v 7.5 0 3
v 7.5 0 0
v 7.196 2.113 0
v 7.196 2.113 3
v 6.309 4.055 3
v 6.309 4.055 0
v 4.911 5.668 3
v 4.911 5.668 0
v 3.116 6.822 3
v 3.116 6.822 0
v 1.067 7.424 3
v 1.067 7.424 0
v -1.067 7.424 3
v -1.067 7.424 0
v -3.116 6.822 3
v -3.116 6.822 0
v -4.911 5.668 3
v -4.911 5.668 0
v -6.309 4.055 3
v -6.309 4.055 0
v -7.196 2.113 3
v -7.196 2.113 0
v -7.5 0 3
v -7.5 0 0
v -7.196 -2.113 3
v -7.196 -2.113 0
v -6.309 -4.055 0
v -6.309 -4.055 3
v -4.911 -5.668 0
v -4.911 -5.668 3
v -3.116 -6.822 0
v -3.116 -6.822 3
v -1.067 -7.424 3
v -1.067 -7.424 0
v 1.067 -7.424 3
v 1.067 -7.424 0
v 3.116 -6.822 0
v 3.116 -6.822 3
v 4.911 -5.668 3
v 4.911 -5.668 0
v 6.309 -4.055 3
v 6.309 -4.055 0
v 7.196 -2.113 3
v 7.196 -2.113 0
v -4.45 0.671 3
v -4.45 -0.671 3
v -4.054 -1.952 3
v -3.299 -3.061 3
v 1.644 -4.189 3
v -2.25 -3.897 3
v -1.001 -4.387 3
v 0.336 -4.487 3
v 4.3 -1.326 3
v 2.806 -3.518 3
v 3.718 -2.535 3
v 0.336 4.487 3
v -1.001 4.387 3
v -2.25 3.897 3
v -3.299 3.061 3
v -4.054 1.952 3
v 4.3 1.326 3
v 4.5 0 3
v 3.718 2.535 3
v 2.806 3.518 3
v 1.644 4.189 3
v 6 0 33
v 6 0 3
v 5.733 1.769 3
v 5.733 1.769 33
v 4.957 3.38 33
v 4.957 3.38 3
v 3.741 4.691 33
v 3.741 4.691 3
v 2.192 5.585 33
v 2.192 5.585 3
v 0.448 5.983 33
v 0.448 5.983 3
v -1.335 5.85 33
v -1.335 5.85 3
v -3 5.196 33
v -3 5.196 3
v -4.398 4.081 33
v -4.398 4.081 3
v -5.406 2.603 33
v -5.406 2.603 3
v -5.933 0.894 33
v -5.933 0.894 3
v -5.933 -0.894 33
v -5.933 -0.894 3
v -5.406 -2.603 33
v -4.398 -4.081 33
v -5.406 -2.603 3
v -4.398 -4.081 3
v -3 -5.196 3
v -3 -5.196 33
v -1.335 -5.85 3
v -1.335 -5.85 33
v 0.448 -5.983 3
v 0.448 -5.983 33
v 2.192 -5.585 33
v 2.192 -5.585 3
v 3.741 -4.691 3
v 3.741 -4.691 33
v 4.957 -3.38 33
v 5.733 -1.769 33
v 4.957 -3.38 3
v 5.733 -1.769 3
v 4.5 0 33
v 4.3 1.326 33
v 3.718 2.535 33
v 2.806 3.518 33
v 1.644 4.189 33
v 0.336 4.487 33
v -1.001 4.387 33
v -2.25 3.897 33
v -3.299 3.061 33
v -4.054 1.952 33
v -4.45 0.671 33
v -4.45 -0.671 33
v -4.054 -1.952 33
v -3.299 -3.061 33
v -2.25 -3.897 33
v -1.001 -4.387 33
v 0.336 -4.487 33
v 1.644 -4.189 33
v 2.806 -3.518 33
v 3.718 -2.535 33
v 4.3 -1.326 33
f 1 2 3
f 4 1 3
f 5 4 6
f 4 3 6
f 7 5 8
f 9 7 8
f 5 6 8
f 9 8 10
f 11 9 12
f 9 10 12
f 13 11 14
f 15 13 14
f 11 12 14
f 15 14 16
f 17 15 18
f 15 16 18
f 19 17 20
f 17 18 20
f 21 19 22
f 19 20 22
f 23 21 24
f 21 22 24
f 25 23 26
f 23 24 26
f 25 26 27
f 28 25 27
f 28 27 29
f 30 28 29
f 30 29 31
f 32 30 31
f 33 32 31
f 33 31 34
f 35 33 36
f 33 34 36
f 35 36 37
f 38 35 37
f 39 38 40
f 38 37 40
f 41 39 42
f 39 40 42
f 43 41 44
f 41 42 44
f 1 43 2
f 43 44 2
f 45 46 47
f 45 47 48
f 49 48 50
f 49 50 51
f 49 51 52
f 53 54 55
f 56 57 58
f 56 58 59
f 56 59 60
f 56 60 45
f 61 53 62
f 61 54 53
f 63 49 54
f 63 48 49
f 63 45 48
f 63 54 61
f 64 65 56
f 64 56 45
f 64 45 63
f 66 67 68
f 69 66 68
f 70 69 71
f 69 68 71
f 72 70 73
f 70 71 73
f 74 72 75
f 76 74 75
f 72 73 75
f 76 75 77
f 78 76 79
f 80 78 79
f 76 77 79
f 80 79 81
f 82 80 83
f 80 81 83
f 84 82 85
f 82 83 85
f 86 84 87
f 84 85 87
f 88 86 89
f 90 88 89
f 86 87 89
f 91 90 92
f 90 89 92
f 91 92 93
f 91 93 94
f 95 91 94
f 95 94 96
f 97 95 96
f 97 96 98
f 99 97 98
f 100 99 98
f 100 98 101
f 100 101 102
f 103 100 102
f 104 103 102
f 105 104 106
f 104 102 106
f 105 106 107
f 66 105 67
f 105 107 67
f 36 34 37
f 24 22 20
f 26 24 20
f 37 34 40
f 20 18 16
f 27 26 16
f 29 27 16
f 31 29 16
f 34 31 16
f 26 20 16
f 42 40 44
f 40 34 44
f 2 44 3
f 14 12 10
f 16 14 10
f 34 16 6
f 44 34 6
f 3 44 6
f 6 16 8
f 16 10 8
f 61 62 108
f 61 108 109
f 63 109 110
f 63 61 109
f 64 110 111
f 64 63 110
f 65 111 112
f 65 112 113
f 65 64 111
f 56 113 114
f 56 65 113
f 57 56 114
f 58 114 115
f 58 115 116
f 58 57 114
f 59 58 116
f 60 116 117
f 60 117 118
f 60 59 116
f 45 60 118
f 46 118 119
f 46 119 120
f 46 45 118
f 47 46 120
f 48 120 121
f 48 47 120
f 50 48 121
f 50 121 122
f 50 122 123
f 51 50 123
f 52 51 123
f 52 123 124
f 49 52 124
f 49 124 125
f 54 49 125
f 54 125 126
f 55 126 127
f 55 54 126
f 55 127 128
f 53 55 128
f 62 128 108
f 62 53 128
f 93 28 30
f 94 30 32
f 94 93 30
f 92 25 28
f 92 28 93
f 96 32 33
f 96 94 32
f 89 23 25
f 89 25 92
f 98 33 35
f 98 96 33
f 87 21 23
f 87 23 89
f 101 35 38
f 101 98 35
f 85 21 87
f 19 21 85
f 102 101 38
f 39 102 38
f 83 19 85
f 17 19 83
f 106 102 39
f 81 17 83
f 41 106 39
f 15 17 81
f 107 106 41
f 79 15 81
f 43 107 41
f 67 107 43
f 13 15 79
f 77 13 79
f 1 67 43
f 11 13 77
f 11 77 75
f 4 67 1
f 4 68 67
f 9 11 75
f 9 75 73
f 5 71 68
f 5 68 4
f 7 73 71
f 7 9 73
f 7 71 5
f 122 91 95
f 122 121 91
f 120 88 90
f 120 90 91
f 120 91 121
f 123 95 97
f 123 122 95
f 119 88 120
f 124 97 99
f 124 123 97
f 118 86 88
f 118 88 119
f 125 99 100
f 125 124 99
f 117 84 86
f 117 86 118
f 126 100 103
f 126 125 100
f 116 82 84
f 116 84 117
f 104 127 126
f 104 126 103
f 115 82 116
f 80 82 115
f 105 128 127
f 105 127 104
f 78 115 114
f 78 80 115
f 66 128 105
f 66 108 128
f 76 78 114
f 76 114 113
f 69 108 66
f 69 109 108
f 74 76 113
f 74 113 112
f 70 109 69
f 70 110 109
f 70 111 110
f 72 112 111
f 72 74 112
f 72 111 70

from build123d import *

# Parameters (mm, degrees)
ESBO_O1_R                = 7.5
RESSALTO_EXTRUS_O1_DEPTH = 3
ESBO_O2_R                = 6
ESBO_O2_R_2              = 4.5
RESSALTO_EXTRUS_O2_DEPTH = 30


with BuildPart() as part:
    # Esboço1 → Ressalto-extrusão1 (new body)
    with BuildSketch(Plane.XY):
        Circle(ESBO_O1_R)
    extrude(amount=RESSALTO_EXTRUS_O1_DEPTH)

    # Esboço2 → Ressalto-extrusão2 (add)
    with BuildSketch(Plane.XY.offset(3)):
        Circle(ESBO_O2_R)
        Circle(ESBO_O2_R_2, mode=Mode.SUBTRACT)
    extrude(amount=RESSALTO_EXTRUS_O2_DEPTH)


solid = part.part
